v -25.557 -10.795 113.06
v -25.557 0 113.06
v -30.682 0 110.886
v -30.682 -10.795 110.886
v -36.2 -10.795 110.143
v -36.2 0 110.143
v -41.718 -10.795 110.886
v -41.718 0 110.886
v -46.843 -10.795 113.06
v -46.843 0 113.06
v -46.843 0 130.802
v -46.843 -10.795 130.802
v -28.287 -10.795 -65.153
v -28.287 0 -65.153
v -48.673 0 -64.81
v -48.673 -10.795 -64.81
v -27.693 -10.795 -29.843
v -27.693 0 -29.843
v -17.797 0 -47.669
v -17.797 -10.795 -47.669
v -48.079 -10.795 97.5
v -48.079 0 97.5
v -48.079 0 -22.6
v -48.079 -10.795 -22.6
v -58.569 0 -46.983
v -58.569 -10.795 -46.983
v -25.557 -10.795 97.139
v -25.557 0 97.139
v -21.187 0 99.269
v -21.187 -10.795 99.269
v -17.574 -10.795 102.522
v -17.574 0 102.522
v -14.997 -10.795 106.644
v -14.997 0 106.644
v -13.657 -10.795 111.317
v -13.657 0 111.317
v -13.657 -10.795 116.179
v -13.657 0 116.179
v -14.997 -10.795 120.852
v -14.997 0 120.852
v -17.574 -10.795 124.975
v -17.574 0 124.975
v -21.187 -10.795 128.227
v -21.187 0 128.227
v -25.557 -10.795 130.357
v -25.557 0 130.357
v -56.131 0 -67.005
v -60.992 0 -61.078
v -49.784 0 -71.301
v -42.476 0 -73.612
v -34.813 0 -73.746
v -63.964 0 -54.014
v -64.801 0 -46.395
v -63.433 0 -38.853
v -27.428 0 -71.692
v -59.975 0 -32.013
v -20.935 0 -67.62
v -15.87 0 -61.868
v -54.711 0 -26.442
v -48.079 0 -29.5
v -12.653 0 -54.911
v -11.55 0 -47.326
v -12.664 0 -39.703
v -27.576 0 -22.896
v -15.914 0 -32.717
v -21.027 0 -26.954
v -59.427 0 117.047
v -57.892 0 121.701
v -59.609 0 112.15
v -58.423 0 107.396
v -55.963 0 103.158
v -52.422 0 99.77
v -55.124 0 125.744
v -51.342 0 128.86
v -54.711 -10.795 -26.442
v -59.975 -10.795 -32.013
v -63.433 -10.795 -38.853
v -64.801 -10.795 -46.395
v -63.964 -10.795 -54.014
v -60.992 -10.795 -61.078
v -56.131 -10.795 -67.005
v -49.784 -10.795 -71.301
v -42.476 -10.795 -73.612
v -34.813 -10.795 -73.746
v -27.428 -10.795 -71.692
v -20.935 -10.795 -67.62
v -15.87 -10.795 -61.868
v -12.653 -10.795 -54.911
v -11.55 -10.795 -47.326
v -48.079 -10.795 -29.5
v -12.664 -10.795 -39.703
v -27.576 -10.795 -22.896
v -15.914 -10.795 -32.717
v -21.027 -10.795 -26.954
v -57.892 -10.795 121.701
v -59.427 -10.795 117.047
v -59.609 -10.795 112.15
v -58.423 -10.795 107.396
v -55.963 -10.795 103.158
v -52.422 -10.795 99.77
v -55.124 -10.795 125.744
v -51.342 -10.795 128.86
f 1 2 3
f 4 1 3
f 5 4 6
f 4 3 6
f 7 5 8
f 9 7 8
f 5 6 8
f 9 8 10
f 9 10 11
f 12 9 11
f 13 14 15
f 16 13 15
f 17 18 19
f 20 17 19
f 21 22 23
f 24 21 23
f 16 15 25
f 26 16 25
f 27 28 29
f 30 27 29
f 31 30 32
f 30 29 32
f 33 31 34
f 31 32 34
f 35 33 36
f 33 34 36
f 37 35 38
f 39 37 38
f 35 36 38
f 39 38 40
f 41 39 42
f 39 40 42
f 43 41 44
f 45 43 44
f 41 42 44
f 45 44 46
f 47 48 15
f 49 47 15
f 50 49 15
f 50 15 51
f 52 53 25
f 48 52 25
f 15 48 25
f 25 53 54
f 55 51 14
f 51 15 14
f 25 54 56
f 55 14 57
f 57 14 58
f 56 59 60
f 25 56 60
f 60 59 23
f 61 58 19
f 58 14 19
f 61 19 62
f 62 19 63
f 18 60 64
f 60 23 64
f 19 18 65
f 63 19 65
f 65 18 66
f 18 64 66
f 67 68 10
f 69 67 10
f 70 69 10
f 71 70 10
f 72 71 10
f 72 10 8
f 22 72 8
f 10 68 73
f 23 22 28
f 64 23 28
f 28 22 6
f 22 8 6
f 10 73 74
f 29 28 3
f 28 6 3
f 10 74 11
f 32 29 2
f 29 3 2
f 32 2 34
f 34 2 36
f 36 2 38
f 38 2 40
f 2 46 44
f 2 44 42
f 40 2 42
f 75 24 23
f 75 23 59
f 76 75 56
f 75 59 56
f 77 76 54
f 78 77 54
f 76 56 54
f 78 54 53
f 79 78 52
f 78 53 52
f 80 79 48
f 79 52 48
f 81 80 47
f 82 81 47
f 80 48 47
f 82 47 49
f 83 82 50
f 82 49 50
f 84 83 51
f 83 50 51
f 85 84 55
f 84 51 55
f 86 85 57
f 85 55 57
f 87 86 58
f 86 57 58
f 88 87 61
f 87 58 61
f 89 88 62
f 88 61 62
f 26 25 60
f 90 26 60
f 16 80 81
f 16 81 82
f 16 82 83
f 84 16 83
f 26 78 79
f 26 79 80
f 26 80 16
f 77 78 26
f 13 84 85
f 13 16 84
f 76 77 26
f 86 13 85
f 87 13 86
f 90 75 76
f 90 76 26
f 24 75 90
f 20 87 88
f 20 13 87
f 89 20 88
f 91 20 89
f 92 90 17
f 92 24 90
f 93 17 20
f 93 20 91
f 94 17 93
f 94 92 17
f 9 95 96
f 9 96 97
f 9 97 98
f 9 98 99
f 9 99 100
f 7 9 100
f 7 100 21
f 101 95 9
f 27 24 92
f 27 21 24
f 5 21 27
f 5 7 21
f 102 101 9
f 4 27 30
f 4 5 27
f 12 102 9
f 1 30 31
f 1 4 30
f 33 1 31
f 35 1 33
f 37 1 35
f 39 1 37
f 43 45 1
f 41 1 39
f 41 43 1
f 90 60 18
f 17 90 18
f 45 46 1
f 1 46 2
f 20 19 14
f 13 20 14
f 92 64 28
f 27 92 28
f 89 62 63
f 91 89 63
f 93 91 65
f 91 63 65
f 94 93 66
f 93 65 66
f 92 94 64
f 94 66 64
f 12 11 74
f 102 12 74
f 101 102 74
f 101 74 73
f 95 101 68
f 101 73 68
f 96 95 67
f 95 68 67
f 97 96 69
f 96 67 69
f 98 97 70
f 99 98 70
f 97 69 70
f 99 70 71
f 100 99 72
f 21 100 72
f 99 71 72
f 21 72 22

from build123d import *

# Parameters (mm, degrees)
F1_DEPTH = 9.017
F2_DEPTH = 10.795


with BuildPart() as f1:
    # F0 (on Front) → F1 (new body)
    with BuildSketch(Plane.XZ):
        with BuildLine():
            Line((-48.0792992256, 97.4998560334), (-25.5571910474, 97.1389572937))
            ThreePointArc((-25.5571910474, 97.1389572937), (-13.4866539111, 113.7481608485), (-25.5571910474, 130.3573644034))
            Line((-25.5571910474, 130.3573644034), (-25.5571910474, 113.0603018233))
            ThreePointArc((-25.5571910474, 113.0603018233), (-36.2000364442, 110.1431708658), (-46.842881841, 113.0603018233))
            Line((-46.842881841, 113.0603018233), (-46.842881841, 130.8020415732))
            ThreePointArc((-46.842881841, 130.8020415732), (-59.6904318944, 114.6049901828), (-48.0792992256, 97.4998560334))
        make_face()
    extrude(amount=F1_DEPTH)

    # F0 (on Front) → F2 (join)
    with BuildSketch(Plane.XZ):
        with BuildLine():
            Line((-27.6932814315, -29.8430773328), (-17.7972615414, -47.6693533076))
            Line((-17.7972615414, -47.6693533076), (-28.2872594454, -65.1526959162))
            Line((-28.2872594454, -65.1526959162), (-48.6732772395, -64.80976255))
            Line((-48.6732772395, -64.80976255), (-58.5692971296, -46.9834865752))
            Line((-58.5692971296, -46.9834865752), (-48.0792992256, -29.5001439666))
            Line((-48.0792992256, -29.5001439666), (-48.0792992256, -22.5995532387))
            ThreePointArc((-48.0792992256, -22.5995532387), (-53.1128208355, -69.3822114075), (-11.5496699932, -47.3264199414))
            ThreePointArc((-11.5496699932, -47.3264199414), (-15.9139266557, -32.7173447543), (-27.5764183831, -22.8960362495))
            Line((-27.5764183831, -22.8960362495), (-27.6932814315, -29.8430773328))
        make_face()
        with BuildLine():
            Line((-48.0792992256, -29.5001439666), (-27.6932814315, -29.8430773328))
            Line((-27.6932814315, -29.8430773328), (-27.5764183831, -22.8960362495))
            ThreePointArc((-27.5764183831, -22.8960362495), (-37.7981828569, -20.6955948077), (-48.0792992256, -22.5995532387))
            Line((-48.0792992256, -22.5995532387), (-48.0792992256, -29.5001439666))
        make_face()
        with BuildLine():
            ThreePointArc((-48.0792992256, -22.5995532387), (-37.7981828569, -20.6955948077), (-27.5764183831, -22.8960362495))
            Line((-27.5764183831, -22.8960362495), (-25.5571910474, 97.1389572937))
            Line((-25.5571910474, 97.1389572937), (-48.0792992256, 97.4998560334))
            Line((-48.0792992256, 97.4998560334), (-48.0792992256, -22.5995532387))
        make_face()
        with BuildLine():
            Line((-48.0792992256, 97.4998560334), (-25.5571910474, 97.1389572937))
            ThreePointArc((-25.5571910474, 97.1389572937), (-13.4866539111, 113.7481608485), (-25.5571910474, 130.3573644034))
            Line((-25.5571910474, 130.3573644034), (-25.5571910474, 113.0603018233))
            ThreePointArc((-25.5571910474, 113.0603018233), (-36.2000364442, 110.1431708658), (-46.842881841, 113.0603018233))
            Line((-46.842881841, 113.0603018233), (-46.842881841, 130.8020415732))
            ThreePointArc((-46.842881841, 130.8020415732), (-59.6904318944, 114.6049901828), (-48.0792992256, 97.4998560334))
        make_face()
    extrude(amount=F2_DEPTH)


solid = f1.part
